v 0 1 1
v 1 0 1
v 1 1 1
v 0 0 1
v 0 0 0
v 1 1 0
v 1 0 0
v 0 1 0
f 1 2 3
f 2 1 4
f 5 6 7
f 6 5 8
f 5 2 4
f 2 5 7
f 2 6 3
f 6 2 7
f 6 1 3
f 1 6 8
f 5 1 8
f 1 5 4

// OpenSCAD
// R6 PROTOTYPE paint geometry: fit/layout artwork only, not paint-ready production masks.
// The visible surfaces swap against R5: the cover is the keyboard/OLED lid; the deck is the
// cassette's Waveshare 7-inch display frame.  Component dimensions and the host/plate outlines
// come from common.scad.  Proposed R6-only placements are named here, not hidden in paint.py.
// The keyboard-lid parameters are now shared with r6_lid_plate.scad through common.scad.
// Display-frame positions and its controls remain proposals until that separate CAD is complete.
include <../common.scad>

// Waveshare 7inch DSI LCD (C), measured in cad/r5_lid_cover_waveshare_7in.scad.
R6_PANEL_W = 192.96;
R6_PANEL_H = 110.76;
R6_PANEL_R = 8;
R6_ACTIVE_W = 154.88;
R6_ACTIVE_H = 86.72;
R6_PANEL_X = (COVER_W - R6_PANEL_W) / 2;
R6_PANEL_Y = 30.0;  // hinge-side proposal from the R6 first-pass plan study

// Proposed display-frame controls, right of/below the panel.  Verify connectors and cable bends
// against the final R6 frame before using any generated mask for paint.
R6_BTN_X = 225.0;
R6_BTN_Y = 160.0;
R6_CHG_X = 225.0;
R6_CHG_Y = 90.0;

// Common painted outlines.  The lower frame retains R5's cavity-height plate outline.
echo(P_W = COVER_W);
echo(P_L = COVER_L);
echo(P_DECK_W = R5_DECK_W);
echo(P_DECK_L = R5_DECK_L);
echo(P_DECK_X0 = R5_DECK_X0);
echo(P_DECK_Y0 = R5_DECK_Y0);
echo(P_DECK_R = R5_DECK_R);
echo(P_DECK_T = R5_DECK_T);
echo(P_COVER_R = COVER_R);

// R6 lid: retain the measured K06/OLED/button envelopes at the proposed R5-derived coordinates.
echo(P_KB_X0 = R5_KB_X0);
echo(P_KB_Y0 = R5_KB_Y0);
echo(P_KB_W = R5_KB_POCKET[0]);
echo(P_KB_H = R5_KB_POCKET[1]);
echo(P_KB_R = R5_KB_CORNER + R5_KB_CLR);
echo(P_OLED_X0 = R5_OLED_WIN_X0);
echo(P_OLED_Y0 = R5_OLED_WIN_Y0);
echo(P_OLED_W = R5_OLED_WIN[0]);
echo(P_OLED_H = R5_OLED_WIN[1]);
echo(P_OBTN_X = R5_OLED_BTN_X);
echo(P_OBTN_Y = R5_OLED_BTN_Y);
echo(P_OBTN_D = R5_OLED_BTN_D);

// R6 display frame: panel, flat paint-border datum and active-area annotation.
echo(P_C_GAP = COVER_GAP);
echo(P_C_FRAME = COVER_FRAME);
echo(P_PANEL_X = R6_PANEL_X);
echo(P_PANEL_Y = R6_PANEL_Y);
echo(P_DISP_W = R6_PANEL_W);
echo(P_DISP_H = R6_PANEL_H);
echo(P_DISP_R = R6_PANEL_R);
echo(P_ACTIVE_W = R6_ACTIVE_W);
echo(P_ACTIVE_H = R6_ACTIVE_H);

// Controls on the display frame, not on the keyboard lid.
echo(P_BTN_X = R6_BTN_X);
echo(P_BTN_Y = R6_BTN_Y);
echo(P_BTN_D = R5_BTN_D);
echo(P_BTN_BODY = R5_BTN_BODY);
echo(P_CHG_X = R6_CHG_X);
echo(P_CHG_Y = R6_CHG_Y);
echo(P_CHG_D = R5_CHG_D);
echo(P_CHG_NUT_D = R5_CHG_NUT_D);

// Proposed removable-frame fastener positions, inherited from the R5 plate for this study.
echo(P_S0 = R5_SCREWS[0][0]); echo(P_S0Y = R5_SCREWS[0][1]);
echo(P_S1 = R5_SCREWS[1][0]); echo(P_S1Y = R5_SCREWS[1][1]);
echo(P_S2 = R5_SCREWS[2][0]); echo(P_S2Y = R5_SCREWS[2][1]);
echo(P_S3 = R5_SCREWS[3][0]); echo(P_S3Y = R5_SCREWS[3][1]);
echo(P_S4 = R5_SCREWS[4][0]); echo(P_S4Y = R5_SCREWS[4][1]);
echo(P_S5 = R5_SCREWS[5][0]); echo(P_S5Y = R5_SCREWS[5][1]);
echo(P_S6 = R5_SCREWS[6][0]); echo(P_S6Y = R5_SCREWS[6][1]);

cube(1);
